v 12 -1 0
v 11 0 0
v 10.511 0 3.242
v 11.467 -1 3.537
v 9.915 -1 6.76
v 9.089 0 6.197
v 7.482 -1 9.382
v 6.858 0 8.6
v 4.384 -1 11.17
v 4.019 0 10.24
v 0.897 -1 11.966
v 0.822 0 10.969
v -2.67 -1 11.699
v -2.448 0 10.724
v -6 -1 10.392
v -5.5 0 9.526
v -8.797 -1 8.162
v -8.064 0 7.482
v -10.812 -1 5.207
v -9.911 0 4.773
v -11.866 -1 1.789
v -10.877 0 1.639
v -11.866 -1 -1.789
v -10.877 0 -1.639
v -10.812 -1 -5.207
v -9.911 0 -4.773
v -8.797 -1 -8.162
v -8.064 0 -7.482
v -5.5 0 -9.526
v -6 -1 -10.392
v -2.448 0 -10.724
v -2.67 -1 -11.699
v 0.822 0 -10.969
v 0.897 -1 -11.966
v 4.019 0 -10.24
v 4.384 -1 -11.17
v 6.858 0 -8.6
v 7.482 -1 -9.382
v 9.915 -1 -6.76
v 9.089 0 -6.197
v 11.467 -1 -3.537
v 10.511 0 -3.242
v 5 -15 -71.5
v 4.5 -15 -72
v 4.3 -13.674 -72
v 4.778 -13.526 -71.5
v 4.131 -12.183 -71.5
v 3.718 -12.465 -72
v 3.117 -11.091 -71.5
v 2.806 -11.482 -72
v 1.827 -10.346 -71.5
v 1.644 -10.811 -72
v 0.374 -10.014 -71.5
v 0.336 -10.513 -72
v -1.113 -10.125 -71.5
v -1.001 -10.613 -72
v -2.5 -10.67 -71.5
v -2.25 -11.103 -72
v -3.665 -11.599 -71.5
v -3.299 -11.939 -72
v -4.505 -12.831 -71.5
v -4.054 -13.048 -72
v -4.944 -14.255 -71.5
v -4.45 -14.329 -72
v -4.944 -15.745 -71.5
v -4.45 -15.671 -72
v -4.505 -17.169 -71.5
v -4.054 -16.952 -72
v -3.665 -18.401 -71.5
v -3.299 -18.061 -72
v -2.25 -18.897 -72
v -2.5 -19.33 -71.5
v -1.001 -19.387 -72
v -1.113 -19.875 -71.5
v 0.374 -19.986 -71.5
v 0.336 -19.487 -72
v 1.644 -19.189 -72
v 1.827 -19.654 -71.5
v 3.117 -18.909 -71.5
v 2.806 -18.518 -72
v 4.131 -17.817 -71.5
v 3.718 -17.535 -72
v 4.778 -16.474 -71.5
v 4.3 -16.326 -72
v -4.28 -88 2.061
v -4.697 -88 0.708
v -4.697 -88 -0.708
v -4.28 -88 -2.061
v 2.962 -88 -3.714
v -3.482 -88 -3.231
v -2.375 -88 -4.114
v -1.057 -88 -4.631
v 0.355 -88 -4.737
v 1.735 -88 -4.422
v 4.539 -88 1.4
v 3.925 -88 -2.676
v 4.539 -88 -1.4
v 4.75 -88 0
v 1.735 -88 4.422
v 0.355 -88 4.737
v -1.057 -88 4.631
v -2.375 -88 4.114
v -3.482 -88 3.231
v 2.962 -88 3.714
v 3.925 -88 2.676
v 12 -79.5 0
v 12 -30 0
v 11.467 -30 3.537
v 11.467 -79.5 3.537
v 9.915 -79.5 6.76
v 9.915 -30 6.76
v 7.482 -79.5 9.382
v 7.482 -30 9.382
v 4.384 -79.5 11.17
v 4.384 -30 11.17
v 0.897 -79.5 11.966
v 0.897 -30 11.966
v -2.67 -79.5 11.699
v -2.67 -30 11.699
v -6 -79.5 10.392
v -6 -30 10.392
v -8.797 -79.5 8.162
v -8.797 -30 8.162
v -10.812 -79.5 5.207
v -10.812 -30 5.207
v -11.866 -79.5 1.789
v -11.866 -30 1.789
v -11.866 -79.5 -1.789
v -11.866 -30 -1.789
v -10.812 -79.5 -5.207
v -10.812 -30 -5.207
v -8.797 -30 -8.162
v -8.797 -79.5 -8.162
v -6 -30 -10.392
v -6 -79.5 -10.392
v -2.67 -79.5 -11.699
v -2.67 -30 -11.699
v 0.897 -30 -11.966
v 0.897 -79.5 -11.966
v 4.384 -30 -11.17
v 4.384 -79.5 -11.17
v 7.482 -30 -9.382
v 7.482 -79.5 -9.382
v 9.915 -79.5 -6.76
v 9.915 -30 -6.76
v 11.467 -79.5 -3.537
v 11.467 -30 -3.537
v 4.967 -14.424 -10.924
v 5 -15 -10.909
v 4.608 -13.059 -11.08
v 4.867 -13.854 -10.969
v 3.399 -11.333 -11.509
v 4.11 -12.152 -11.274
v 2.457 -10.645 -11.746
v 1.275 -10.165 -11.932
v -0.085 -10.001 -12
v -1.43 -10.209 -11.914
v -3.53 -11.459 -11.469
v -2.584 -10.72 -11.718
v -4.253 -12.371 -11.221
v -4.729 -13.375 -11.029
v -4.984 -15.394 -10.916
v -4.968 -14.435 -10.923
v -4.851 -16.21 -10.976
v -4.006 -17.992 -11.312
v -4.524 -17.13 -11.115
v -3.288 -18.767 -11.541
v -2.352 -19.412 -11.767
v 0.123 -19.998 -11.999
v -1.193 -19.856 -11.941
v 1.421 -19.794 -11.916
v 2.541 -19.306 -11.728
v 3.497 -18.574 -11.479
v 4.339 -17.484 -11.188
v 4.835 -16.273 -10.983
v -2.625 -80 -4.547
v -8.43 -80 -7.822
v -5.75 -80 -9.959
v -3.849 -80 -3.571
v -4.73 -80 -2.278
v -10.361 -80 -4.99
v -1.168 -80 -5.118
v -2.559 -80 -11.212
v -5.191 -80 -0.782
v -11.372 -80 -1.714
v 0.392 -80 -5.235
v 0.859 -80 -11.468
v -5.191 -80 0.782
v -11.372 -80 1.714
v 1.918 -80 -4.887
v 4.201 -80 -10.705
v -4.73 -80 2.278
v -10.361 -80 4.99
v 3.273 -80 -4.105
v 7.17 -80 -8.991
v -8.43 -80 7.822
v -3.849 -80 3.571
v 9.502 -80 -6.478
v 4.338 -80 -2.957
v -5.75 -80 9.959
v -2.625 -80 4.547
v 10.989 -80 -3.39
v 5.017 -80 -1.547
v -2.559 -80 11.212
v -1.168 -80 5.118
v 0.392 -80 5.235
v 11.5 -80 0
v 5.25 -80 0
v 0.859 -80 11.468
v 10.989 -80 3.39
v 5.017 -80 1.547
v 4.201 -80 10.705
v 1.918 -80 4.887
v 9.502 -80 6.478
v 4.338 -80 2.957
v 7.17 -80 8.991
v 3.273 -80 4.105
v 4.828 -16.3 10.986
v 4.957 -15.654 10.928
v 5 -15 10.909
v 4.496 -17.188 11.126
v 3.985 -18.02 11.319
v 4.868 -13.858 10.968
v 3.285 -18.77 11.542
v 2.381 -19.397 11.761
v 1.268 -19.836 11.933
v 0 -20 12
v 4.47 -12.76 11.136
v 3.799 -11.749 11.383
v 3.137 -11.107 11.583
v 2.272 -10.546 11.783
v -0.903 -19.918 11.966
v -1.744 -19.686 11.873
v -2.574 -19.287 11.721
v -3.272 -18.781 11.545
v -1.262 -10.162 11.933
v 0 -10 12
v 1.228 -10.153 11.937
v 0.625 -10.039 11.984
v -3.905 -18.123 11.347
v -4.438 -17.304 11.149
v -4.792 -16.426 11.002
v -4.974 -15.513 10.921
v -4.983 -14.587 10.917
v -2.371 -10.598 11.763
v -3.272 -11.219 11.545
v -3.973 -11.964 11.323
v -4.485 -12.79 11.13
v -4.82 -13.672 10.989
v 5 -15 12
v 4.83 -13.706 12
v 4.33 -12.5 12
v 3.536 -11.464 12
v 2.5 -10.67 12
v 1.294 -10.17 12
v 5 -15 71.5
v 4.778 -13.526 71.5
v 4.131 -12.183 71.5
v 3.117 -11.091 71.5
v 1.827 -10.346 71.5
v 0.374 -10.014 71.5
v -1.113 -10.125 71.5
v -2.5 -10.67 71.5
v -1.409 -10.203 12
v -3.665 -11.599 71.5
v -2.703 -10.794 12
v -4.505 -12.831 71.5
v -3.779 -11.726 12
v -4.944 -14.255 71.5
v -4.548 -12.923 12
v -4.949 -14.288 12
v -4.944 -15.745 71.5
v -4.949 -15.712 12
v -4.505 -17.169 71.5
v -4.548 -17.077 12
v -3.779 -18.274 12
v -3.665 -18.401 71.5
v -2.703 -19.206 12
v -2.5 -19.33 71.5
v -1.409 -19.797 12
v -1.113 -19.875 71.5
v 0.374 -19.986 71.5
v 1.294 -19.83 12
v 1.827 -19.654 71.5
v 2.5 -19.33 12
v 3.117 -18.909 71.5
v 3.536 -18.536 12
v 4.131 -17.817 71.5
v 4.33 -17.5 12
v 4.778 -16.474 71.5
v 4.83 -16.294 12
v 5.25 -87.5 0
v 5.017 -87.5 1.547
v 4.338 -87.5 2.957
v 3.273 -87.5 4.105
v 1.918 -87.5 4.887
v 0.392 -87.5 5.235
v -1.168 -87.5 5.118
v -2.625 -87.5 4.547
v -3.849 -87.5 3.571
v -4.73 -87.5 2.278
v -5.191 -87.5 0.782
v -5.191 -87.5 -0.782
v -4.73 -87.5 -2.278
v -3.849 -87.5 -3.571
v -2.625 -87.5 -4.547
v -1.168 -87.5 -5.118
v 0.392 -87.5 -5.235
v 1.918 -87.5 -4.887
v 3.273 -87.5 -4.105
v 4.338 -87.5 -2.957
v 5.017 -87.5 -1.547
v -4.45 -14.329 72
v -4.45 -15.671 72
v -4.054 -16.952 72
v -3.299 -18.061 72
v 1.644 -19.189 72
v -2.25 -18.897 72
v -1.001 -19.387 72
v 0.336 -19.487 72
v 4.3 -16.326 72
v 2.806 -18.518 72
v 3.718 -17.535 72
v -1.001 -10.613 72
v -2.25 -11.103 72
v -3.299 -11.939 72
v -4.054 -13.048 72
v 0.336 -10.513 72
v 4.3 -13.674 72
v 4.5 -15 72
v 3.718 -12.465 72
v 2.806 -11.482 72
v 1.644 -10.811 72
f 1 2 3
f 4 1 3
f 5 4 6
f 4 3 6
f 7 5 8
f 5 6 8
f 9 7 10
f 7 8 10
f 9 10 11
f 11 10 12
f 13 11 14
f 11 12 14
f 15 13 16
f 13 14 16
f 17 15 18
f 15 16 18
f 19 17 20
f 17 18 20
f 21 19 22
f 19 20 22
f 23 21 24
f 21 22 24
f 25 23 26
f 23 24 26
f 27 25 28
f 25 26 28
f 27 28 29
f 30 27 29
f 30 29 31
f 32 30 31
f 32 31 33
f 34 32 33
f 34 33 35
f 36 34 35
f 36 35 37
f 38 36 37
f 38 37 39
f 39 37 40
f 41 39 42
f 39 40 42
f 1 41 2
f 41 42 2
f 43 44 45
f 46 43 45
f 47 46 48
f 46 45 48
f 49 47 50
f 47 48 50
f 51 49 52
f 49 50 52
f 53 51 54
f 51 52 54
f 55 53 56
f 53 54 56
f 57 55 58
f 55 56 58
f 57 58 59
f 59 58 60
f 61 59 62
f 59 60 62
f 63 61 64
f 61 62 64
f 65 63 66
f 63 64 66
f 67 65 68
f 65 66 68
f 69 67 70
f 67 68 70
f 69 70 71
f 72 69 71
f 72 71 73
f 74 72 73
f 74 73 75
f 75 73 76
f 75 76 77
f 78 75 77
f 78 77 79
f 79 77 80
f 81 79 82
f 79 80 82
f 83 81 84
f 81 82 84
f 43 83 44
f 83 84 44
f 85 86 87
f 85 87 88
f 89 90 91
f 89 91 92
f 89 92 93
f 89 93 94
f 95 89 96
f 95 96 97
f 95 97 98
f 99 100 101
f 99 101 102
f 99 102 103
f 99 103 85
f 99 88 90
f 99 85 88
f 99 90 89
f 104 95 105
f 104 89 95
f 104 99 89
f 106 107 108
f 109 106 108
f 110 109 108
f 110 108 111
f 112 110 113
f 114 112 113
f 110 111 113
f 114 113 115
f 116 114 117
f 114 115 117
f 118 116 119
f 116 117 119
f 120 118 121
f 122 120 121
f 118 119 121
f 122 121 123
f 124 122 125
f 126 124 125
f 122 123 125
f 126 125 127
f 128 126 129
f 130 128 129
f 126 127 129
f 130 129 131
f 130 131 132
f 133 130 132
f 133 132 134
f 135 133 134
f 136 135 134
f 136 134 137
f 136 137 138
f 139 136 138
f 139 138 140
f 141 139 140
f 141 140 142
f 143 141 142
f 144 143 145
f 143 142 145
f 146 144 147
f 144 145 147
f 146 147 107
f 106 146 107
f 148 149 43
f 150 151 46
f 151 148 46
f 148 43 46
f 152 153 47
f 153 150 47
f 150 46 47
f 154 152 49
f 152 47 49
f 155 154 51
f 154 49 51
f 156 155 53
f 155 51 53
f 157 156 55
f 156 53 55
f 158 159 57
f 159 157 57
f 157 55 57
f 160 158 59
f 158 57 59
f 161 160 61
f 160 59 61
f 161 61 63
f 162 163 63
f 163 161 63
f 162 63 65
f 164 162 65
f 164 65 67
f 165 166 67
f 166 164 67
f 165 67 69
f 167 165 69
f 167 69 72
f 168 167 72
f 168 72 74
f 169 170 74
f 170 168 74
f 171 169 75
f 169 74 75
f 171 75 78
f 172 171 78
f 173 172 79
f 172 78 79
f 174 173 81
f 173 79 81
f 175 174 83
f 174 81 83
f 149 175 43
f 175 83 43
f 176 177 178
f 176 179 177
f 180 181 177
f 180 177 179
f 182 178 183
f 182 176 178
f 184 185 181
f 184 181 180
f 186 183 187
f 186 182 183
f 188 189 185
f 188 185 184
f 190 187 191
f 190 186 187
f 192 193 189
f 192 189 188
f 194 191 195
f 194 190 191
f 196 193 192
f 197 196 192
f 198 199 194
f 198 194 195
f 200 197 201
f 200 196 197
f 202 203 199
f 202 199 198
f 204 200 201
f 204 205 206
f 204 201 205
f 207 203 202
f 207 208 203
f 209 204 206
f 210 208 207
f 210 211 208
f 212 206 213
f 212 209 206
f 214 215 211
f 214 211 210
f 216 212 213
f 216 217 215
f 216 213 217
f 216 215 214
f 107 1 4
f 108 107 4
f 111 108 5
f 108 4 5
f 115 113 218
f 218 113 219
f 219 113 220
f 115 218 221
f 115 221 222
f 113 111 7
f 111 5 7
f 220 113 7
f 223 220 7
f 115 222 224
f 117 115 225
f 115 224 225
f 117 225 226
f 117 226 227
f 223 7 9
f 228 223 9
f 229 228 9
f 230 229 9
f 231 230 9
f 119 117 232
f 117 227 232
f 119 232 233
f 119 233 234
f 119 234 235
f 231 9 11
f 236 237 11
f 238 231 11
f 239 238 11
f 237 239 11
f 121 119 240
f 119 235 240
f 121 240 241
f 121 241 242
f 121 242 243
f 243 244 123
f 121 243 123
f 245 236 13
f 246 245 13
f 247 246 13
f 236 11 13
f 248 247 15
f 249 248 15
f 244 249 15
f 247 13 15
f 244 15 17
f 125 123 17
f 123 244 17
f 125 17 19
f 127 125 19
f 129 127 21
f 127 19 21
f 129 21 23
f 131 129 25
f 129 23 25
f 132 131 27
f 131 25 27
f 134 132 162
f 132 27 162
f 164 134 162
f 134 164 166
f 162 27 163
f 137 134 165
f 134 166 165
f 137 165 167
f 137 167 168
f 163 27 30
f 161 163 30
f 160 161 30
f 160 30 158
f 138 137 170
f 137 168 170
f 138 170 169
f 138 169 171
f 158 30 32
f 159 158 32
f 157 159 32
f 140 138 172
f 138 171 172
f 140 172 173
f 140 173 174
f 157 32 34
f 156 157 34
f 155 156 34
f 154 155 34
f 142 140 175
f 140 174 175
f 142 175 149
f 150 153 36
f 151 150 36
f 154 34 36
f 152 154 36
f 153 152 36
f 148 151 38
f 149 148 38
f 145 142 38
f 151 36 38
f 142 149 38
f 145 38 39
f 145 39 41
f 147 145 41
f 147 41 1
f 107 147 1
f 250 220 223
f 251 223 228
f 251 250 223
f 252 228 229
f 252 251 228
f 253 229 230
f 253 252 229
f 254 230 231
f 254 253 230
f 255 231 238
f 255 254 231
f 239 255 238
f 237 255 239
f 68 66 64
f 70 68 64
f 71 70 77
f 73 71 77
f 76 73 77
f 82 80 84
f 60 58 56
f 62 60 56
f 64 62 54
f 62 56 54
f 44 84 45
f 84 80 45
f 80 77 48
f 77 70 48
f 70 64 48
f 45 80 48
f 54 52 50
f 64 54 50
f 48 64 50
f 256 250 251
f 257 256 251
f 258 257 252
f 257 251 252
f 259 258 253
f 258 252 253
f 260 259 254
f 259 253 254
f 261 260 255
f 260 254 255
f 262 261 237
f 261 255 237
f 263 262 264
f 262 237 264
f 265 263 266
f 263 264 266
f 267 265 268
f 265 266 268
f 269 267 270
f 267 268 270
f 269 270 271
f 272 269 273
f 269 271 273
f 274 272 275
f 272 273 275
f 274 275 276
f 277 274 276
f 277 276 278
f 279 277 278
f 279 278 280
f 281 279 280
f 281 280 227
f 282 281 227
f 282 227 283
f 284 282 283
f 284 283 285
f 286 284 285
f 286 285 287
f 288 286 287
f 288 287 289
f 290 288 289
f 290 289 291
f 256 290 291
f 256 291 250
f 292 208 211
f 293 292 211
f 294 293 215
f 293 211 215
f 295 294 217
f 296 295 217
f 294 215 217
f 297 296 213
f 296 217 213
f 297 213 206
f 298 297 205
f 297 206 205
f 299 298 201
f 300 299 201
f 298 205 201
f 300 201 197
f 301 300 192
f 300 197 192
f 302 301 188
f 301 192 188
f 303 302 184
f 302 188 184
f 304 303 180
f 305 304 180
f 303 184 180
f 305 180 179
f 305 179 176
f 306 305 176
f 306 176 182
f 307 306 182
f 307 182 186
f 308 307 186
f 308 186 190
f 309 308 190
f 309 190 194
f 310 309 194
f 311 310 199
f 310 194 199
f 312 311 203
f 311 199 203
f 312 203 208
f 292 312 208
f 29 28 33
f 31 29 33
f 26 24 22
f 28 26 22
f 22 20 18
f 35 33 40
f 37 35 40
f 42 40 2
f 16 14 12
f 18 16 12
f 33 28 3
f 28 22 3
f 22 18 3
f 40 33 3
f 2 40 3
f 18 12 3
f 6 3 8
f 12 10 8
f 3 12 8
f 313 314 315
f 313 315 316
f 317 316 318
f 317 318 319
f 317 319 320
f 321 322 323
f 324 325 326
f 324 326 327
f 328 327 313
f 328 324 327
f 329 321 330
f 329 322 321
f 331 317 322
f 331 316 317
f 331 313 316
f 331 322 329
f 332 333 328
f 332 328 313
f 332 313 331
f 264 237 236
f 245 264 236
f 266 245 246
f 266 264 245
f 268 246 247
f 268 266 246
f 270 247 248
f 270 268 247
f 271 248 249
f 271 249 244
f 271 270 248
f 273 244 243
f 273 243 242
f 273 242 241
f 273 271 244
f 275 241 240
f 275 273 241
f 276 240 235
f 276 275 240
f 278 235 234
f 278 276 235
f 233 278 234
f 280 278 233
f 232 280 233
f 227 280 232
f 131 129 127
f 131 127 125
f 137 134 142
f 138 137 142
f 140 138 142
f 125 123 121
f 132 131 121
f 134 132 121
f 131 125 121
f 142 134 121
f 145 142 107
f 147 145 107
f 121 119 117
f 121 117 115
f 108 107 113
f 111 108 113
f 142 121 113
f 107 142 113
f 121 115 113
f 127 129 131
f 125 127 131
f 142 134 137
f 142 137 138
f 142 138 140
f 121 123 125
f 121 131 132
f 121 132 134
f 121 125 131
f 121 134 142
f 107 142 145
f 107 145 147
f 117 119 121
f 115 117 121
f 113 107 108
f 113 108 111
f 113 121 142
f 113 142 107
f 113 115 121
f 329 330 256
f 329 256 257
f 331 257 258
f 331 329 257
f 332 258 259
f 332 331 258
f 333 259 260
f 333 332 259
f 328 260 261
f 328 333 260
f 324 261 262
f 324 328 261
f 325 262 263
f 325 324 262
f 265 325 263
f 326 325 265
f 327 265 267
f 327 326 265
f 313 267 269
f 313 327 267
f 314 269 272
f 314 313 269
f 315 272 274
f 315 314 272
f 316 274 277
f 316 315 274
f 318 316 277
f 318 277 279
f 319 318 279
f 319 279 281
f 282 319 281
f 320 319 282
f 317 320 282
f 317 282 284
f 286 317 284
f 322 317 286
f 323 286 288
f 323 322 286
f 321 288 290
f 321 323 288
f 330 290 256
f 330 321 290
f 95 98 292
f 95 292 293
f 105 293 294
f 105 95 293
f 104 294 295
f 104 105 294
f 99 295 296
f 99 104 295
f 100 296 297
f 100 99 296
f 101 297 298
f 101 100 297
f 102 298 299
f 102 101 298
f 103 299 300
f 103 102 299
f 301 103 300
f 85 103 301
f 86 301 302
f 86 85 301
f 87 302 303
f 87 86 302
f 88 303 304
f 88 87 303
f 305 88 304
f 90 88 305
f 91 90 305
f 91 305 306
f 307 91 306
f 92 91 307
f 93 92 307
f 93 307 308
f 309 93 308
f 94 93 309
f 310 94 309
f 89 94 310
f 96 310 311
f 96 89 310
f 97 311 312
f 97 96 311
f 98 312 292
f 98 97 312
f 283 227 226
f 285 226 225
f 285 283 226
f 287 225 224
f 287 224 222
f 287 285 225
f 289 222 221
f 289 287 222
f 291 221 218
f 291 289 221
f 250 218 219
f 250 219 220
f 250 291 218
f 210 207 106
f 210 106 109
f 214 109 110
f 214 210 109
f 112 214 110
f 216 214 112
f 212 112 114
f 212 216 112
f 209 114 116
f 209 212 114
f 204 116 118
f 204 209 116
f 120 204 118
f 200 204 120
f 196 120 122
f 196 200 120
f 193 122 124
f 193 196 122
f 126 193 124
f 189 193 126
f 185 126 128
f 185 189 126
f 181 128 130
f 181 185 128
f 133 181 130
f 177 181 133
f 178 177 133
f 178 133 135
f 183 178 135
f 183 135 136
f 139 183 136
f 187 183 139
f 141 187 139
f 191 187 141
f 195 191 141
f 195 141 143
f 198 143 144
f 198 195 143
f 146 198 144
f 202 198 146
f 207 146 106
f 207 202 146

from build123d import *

# Parameters (mm, degrees)
F0_R          = 12
F1_DEPTH      = 20
F2_R          = 12
F3_DEPTH      = 10
F6_R          = 5
F7_DEPTH      = 60
F7_DEPTH_BACK = 3
F8_R          = 5
F9_DEPTH      = 60
F9_DEPTH_BACK = 3
F10_SIZE      = 1
F11_SIZE      = 0.5
F12_R         = 12
F13_DEPTH     = 50
F14_R         = 5.25
F15_DEPTH     = 8
F16_SIZE      = 0.5


with BuildPart() as f1:
    # F0 (on Front) → F1 (new body)
    with BuildSketch(Plane.XZ):
        Circle(F0_R)
    extrude(amount=F1_DEPTH)

    # F2 (on face) → F3 (join)
    with BuildSketch(Plane.XZ.offset(20)):
        Circle(F2_R)
    extrude(amount=F3_DEPTH)

    # F6 (on offset) → F7 (join, two sides)
    with BuildSketch(Plane.XY.offset(12)) as f7_sk:
        with Locations((0, -15)):
            Circle(F6_R)
    extrude(amount=F7_DEPTH)
    extrude(f7_sk.sketch, amount=-F7_DEPTH_BACK)

    # F8 (on offset) → F9 (join, two sides)
    with BuildSketch(Plane.XY.offset(-12)) as f9_sk:
        with Locations((0, -15)):
            Circle(F8_R)
    extrude(amount=-F9_DEPTH)
    extrude(f9_sk.sketch, amount=F9_DEPTH_BACK)

    # F10
    f10_edges = [f1.edges().sort_by_distance(p)[0] for p in [
        (-12, 0, 0),
    ]]
    chamfer(f10_edges, length=F10_SIZE)

    # F11
    f11_edges = [f1.edges().sort_by_distance(p)[0] for p in [
        (-5, -15, 72),
        (-5, -15, -72),
    ]]
    chamfer(f11_edges, length=F11_SIZE)


with BuildPart() as f13:
    # F12 (on face) → F13 (new body)
    with BuildSketch(Plane.XZ.offset(30)):
        Circle(F12_R)
    extrude(amount=F13_DEPTH)

    # F14 (on face) → F15 (join)
    with BuildSketch(Plane.XZ.offset(80)):
        Circle(F14_R)
    extrude(amount=F15_DEPTH)

    # F16
    f16_edges = [f13.edges().sort_by_distance(p)[0] for p in [
        (-12, -80, 0),
        (-5.25, -88, 0),
    ]]
    chamfer(f16_edges, length=F16_SIZE)


solid = Compound([f1.part, f13.part])
